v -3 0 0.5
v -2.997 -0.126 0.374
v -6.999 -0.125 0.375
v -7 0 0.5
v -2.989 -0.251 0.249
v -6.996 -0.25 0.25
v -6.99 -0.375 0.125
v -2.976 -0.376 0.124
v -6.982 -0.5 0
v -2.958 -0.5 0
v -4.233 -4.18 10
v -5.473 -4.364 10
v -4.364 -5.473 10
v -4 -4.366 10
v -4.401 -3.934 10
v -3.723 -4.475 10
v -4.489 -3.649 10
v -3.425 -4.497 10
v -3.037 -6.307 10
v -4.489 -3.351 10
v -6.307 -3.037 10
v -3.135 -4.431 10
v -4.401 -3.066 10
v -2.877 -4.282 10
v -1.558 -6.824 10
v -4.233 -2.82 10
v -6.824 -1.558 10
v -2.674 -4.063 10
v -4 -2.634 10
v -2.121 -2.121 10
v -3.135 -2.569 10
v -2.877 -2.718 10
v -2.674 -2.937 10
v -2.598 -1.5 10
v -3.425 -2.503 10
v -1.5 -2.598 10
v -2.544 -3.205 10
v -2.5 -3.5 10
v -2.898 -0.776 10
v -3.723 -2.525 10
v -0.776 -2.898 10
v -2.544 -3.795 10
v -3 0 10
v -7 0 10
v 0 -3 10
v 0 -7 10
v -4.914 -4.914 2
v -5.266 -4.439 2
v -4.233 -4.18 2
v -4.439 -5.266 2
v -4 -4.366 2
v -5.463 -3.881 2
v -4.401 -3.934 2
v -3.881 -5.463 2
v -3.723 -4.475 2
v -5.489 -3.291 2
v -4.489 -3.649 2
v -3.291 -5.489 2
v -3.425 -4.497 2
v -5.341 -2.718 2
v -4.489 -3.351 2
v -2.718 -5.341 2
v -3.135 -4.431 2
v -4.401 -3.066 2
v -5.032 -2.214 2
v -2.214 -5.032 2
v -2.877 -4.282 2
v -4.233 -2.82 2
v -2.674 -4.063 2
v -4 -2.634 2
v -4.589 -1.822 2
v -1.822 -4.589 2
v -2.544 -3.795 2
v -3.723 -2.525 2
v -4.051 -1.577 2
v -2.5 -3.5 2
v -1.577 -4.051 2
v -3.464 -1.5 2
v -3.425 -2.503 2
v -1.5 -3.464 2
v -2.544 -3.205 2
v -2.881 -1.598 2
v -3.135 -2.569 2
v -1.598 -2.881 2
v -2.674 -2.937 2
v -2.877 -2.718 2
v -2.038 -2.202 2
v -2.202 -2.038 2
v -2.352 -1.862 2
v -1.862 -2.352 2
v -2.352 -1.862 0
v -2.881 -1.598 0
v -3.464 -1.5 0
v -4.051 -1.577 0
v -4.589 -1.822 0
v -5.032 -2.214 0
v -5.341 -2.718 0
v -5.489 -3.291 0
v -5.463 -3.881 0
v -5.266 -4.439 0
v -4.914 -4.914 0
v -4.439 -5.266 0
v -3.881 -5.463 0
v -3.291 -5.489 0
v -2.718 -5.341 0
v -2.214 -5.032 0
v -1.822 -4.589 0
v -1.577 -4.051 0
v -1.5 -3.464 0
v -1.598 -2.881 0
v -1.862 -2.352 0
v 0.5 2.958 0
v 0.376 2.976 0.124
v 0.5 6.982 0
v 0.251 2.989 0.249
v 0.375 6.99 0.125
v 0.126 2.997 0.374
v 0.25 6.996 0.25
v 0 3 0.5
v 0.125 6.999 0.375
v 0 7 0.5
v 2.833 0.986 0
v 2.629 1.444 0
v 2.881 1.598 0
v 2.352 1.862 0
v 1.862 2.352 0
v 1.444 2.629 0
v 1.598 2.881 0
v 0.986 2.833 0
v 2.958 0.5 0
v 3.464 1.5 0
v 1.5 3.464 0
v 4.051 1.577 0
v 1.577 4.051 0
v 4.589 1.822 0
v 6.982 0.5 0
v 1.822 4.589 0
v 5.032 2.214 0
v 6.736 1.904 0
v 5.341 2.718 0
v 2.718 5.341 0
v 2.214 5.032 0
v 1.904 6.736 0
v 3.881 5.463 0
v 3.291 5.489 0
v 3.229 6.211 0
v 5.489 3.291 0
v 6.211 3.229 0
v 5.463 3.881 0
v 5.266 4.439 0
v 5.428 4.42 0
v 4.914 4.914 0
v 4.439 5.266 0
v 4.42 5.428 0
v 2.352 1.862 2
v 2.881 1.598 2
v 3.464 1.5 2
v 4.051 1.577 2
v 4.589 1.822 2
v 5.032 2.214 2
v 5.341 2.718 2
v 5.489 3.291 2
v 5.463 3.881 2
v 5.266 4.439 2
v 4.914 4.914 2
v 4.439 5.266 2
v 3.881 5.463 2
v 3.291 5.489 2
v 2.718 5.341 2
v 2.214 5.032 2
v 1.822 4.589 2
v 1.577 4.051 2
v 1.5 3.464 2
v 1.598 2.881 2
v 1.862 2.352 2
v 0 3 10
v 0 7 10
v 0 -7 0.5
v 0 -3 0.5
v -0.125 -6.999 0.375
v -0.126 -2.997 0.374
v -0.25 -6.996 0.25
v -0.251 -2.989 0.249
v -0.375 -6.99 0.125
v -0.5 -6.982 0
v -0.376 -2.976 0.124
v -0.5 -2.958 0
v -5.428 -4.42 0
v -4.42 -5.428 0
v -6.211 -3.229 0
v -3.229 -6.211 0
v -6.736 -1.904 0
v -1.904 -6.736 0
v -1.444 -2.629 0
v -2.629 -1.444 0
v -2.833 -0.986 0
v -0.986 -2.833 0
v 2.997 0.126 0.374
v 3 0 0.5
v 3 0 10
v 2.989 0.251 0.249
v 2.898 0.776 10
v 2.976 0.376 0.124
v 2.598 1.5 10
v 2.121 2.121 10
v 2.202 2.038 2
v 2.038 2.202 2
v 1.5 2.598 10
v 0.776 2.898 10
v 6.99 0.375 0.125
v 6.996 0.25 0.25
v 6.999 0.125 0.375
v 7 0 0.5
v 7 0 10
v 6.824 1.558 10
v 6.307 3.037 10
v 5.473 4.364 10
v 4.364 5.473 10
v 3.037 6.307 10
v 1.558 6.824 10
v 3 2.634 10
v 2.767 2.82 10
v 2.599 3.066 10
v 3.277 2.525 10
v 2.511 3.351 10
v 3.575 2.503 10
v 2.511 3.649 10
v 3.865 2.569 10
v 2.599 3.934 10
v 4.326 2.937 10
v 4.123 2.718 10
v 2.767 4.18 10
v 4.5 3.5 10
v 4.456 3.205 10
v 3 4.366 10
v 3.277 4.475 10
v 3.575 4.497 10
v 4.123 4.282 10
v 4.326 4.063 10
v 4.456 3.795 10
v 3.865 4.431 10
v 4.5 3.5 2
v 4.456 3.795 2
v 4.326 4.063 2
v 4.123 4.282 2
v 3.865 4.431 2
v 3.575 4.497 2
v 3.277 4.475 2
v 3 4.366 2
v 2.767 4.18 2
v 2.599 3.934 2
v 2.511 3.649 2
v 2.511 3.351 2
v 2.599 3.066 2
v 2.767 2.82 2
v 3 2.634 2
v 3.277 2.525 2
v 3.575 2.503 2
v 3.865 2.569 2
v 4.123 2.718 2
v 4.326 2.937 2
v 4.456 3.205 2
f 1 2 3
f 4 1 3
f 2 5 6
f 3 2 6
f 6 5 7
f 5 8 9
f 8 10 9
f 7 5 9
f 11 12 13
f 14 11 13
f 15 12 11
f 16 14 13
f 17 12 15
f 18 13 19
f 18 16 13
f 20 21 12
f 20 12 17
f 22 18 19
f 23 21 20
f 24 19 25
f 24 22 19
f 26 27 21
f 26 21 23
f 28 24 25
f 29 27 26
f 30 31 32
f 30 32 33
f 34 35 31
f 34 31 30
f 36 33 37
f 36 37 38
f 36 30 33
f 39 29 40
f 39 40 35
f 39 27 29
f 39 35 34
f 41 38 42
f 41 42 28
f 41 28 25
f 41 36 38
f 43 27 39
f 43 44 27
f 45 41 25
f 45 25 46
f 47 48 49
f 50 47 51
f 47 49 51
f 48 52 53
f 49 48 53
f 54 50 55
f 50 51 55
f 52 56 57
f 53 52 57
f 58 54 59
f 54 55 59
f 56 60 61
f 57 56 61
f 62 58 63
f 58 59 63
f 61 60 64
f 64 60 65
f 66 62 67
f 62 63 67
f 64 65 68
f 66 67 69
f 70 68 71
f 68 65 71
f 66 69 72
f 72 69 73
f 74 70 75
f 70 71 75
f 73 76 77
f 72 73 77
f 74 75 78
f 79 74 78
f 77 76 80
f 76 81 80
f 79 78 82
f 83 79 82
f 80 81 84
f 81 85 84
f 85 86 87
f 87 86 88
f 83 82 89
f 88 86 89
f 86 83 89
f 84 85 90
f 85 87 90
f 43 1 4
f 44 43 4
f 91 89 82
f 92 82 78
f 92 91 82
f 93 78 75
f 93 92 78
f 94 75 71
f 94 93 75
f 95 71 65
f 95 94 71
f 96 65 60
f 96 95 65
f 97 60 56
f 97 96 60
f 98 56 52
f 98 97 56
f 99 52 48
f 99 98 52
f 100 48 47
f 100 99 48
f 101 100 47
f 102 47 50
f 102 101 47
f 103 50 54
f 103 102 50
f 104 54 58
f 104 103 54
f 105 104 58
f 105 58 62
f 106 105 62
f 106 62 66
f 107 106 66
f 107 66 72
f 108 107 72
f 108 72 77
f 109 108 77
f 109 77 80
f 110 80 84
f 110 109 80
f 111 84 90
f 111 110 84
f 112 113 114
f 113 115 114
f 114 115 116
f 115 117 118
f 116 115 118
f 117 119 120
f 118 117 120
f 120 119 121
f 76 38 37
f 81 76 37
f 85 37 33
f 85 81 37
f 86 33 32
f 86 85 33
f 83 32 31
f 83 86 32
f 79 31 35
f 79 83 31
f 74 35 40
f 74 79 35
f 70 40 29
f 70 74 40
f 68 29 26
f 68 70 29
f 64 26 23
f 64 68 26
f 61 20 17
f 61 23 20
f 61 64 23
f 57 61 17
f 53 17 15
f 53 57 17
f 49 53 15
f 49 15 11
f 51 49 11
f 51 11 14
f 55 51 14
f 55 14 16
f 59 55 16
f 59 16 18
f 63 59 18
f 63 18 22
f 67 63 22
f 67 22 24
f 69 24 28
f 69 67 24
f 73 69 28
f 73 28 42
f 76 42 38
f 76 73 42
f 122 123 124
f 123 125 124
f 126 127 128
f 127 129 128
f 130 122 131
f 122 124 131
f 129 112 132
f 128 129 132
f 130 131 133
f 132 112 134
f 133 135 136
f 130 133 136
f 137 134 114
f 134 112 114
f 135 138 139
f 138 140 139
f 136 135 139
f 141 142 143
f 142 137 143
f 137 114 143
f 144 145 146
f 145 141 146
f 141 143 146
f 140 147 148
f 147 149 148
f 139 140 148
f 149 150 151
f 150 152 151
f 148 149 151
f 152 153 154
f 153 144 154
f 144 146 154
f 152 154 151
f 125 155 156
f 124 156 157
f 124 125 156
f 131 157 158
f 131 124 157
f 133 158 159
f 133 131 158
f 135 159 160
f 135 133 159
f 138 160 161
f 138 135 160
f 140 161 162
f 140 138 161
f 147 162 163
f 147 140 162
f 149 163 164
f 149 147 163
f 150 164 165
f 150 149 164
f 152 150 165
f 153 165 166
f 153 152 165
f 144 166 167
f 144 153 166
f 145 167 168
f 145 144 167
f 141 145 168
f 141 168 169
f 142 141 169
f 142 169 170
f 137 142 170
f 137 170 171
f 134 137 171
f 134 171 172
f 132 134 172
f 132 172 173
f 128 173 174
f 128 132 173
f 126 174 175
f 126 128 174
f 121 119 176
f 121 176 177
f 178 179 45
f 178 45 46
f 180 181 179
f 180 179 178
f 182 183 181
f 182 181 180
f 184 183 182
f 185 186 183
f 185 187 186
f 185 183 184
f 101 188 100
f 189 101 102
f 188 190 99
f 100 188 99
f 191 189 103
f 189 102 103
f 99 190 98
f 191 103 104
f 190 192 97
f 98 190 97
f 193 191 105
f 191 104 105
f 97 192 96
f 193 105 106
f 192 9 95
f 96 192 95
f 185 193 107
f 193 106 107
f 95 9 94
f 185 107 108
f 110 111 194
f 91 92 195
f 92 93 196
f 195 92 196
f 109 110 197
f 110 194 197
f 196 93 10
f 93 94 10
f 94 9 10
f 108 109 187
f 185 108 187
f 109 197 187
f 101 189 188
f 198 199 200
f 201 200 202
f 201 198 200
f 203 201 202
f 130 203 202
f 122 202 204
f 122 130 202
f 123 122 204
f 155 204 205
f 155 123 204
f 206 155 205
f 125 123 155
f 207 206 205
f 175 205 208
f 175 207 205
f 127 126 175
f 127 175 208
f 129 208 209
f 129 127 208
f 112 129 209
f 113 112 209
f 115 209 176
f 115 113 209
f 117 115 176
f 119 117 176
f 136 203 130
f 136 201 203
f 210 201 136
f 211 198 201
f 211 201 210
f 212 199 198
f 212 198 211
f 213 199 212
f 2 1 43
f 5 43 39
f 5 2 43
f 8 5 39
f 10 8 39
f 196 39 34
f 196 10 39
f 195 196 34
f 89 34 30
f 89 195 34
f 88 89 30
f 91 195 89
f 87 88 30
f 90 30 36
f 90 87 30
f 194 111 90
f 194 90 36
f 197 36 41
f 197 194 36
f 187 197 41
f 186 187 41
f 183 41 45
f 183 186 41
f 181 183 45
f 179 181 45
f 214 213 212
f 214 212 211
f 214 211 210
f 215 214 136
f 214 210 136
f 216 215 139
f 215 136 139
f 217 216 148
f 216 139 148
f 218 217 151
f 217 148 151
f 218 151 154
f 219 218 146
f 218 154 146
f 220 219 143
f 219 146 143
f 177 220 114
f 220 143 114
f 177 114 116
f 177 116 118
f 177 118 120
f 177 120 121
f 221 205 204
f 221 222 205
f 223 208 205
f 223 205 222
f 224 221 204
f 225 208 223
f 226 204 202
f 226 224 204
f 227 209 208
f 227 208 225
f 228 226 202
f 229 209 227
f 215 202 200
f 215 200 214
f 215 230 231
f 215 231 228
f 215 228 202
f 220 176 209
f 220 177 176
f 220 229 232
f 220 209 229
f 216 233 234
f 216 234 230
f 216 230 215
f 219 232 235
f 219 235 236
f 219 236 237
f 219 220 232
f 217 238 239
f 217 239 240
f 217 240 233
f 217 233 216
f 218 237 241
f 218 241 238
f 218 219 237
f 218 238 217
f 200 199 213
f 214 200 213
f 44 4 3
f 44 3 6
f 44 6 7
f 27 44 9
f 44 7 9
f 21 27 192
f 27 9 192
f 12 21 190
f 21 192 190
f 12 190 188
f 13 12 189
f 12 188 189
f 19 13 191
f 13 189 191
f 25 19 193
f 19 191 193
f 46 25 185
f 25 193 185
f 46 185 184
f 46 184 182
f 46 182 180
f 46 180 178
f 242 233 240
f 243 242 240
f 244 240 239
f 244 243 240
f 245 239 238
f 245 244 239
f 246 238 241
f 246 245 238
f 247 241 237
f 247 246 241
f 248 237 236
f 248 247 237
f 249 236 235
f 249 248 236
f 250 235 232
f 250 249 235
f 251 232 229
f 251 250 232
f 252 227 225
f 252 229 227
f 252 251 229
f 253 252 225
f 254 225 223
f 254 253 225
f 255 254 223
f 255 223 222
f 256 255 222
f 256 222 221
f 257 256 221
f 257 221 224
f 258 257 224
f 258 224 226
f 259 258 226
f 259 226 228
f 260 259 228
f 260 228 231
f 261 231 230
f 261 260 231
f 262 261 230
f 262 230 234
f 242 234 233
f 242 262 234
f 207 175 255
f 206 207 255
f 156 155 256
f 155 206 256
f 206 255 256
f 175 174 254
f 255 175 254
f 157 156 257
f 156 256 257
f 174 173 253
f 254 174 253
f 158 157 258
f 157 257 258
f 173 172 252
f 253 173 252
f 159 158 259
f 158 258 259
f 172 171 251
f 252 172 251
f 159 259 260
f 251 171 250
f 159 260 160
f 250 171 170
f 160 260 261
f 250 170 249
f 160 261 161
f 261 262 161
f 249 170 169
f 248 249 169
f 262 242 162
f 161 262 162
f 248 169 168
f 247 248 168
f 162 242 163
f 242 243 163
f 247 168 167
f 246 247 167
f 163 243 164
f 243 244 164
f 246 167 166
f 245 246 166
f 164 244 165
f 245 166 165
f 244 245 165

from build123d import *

# Parameters (mm, degrees)
CYLINDER1769_R     = 1
CYLINDER1769_DEPTH = 20
CYLINDER1770_R     = 1
CYLINDER1770_DEPTH = 20
CYLINDER1774_R     = 2
CYLINDER1774_DEPTH = 2
CYLINDER1771_R     = 2
CYLINDER1771_DEPTH = 2
CYLINDER1772_R     = 3
CYLINDER1772_DEPTH = 5
CYLINDER1775_R     = 3
CYLINDER1775_DEPTH = 5
BOX414_W           = 10
BOX414_H           = 20
BOX414_DEPTH       = 10
BOX413_W           = 10
BOX413_H           = 20
BOX413_DEPTH       = 10
TUBE054_R          = 7
TUBE054_R_2        = 1
TUBE054_DEPTH      = 10
CHAMFER014_SIZE    = 0.5


with BuildPart() as v_lec1769:
    # Cylinder1769 → Cylinder1769 (new body)
    with BuildSketch(Plane(origin=(-3.5, -3.5, 0), x_dir=(1, 0, 0), z_dir=(0, 0, 1))):
        Circle(CYLINDER1769_R)
    extrude(amount=CYLINDER1769_DEPTH)


with BuildPart() as compound824:
    # Cylinder1770 → Cylinder1770 (new body)
    with BuildSketch(Plane(origin=(3.5, 3.5, 0), x_dir=(1, 0, 0), z_dir=(0, 0, 1))):
        Circle(CYLINDER1770_R)
    extrude(amount=CYLINDER1770_DEPTH)

    # Compound824: union Válec1769
    add(v_lec1769.part)


with BuildPart() as v_lec1774:
    # Cylinder1774 → Cylinder1774 (new body)
    with BuildSketch(Plane(origin=(-3.5, -3.5, 0), x_dir=(1, 0, 0), z_dir=(0, 0, 1))):
        Circle(CYLINDER1774_R)
    extrude(amount=CYLINDER1774_DEPTH)


with BuildPart() as compound825:
    # Cylinder1771 → Cylinder1771 (new body)
    with BuildSketch(Plane(origin=(3.5, 3.5, 0), x_dir=(1, 0, 0), z_dir=(0, 0, 1))):
        Circle(CYLINDER1771_R)
    extrude(amount=CYLINDER1771_DEPTH)

    # Compound825: union Válec1774
    add(v_lec1774.part)


with BuildPart() as v_lec1772:
    # Cylinder1772 → Cylinder1772 (new body)
    with BuildSketch(Plane.XY.offset(5)):
        Circle(CYLINDER1772_R)
    extrude(amount=CYLINDER1772_DEPTH)


with BuildPart() as v_lec1775:
    # Cylinder1775 → Cylinder1775 (new body)
    with BuildSketch(Plane.XY):
        Circle(CYLINDER1775_R)
    extrude(amount=CYLINDER1775_DEPTH)


with BuildPart() as krychle414:
    # Box414 → Box414 (new body)
    with BuildSketch(Plane(origin=(0, 0, 0), x_dir=(0, 1, 0), z_dir=(0, 0, 1))):
        with Locations((5, 10)):
            Rectangle(BOX414_W, BOX414_H)
    extrude(amount=BOX414_DEPTH)


with BuildPart() as compound823:
    # Box413 → Box413 (new body)
    with BuildSketch(Plane(origin=(0, 0, 0), x_dir=(0, -1, 0), z_dir=(0, 0, 1))):
        with Locations((5, 10)):
            Rectangle(BOX413_W, BOX413_H)
    extrude(amount=BOX413_DEPTH)

    # Compound823: union Krychle414
    add(krychle414.part)


with BuildPart() as chamfer014:
    # Tube054 → Tube054 (new body)
    with BuildSketch(Plane.XY):
        Circle(TUBE054_R)
        Circle(TUBE054_R_2, mode=Mode.SUBTRACT)
    extrude(amount=TUBE054_DEPTH)

    # Cut650: cut Compound823
    add(compound823.part, mode=Mode.SUBTRACT)

    # Cut649: cut Válec1775
    add(v_lec1775.part, mode=Mode.SUBTRACT)

    # Cut652: cut Válec1772
    add(v_lec1772.part, mode=Mode.SUBTRACT)

    # Cut651: cut Compound825
    add(compound825.part, mode=Mode.SUBTRACT)

    # Cut648: cut Compound824
    add(compound824.part, mode=Mode.SUBTRACT)

    # Chamfer014
    chamfer014_edges = [chamfer014.edges().sort_by_distance(p)[0] for p in [
        (0, 5, 0),
        (5, 0, 0),
        (0, -5, 0),
        (-5, 0, 0),
    ]]
    chamfer(chamfer014_edges, length=CHAMFER014_SIZE)


solid = chamfer014.part
